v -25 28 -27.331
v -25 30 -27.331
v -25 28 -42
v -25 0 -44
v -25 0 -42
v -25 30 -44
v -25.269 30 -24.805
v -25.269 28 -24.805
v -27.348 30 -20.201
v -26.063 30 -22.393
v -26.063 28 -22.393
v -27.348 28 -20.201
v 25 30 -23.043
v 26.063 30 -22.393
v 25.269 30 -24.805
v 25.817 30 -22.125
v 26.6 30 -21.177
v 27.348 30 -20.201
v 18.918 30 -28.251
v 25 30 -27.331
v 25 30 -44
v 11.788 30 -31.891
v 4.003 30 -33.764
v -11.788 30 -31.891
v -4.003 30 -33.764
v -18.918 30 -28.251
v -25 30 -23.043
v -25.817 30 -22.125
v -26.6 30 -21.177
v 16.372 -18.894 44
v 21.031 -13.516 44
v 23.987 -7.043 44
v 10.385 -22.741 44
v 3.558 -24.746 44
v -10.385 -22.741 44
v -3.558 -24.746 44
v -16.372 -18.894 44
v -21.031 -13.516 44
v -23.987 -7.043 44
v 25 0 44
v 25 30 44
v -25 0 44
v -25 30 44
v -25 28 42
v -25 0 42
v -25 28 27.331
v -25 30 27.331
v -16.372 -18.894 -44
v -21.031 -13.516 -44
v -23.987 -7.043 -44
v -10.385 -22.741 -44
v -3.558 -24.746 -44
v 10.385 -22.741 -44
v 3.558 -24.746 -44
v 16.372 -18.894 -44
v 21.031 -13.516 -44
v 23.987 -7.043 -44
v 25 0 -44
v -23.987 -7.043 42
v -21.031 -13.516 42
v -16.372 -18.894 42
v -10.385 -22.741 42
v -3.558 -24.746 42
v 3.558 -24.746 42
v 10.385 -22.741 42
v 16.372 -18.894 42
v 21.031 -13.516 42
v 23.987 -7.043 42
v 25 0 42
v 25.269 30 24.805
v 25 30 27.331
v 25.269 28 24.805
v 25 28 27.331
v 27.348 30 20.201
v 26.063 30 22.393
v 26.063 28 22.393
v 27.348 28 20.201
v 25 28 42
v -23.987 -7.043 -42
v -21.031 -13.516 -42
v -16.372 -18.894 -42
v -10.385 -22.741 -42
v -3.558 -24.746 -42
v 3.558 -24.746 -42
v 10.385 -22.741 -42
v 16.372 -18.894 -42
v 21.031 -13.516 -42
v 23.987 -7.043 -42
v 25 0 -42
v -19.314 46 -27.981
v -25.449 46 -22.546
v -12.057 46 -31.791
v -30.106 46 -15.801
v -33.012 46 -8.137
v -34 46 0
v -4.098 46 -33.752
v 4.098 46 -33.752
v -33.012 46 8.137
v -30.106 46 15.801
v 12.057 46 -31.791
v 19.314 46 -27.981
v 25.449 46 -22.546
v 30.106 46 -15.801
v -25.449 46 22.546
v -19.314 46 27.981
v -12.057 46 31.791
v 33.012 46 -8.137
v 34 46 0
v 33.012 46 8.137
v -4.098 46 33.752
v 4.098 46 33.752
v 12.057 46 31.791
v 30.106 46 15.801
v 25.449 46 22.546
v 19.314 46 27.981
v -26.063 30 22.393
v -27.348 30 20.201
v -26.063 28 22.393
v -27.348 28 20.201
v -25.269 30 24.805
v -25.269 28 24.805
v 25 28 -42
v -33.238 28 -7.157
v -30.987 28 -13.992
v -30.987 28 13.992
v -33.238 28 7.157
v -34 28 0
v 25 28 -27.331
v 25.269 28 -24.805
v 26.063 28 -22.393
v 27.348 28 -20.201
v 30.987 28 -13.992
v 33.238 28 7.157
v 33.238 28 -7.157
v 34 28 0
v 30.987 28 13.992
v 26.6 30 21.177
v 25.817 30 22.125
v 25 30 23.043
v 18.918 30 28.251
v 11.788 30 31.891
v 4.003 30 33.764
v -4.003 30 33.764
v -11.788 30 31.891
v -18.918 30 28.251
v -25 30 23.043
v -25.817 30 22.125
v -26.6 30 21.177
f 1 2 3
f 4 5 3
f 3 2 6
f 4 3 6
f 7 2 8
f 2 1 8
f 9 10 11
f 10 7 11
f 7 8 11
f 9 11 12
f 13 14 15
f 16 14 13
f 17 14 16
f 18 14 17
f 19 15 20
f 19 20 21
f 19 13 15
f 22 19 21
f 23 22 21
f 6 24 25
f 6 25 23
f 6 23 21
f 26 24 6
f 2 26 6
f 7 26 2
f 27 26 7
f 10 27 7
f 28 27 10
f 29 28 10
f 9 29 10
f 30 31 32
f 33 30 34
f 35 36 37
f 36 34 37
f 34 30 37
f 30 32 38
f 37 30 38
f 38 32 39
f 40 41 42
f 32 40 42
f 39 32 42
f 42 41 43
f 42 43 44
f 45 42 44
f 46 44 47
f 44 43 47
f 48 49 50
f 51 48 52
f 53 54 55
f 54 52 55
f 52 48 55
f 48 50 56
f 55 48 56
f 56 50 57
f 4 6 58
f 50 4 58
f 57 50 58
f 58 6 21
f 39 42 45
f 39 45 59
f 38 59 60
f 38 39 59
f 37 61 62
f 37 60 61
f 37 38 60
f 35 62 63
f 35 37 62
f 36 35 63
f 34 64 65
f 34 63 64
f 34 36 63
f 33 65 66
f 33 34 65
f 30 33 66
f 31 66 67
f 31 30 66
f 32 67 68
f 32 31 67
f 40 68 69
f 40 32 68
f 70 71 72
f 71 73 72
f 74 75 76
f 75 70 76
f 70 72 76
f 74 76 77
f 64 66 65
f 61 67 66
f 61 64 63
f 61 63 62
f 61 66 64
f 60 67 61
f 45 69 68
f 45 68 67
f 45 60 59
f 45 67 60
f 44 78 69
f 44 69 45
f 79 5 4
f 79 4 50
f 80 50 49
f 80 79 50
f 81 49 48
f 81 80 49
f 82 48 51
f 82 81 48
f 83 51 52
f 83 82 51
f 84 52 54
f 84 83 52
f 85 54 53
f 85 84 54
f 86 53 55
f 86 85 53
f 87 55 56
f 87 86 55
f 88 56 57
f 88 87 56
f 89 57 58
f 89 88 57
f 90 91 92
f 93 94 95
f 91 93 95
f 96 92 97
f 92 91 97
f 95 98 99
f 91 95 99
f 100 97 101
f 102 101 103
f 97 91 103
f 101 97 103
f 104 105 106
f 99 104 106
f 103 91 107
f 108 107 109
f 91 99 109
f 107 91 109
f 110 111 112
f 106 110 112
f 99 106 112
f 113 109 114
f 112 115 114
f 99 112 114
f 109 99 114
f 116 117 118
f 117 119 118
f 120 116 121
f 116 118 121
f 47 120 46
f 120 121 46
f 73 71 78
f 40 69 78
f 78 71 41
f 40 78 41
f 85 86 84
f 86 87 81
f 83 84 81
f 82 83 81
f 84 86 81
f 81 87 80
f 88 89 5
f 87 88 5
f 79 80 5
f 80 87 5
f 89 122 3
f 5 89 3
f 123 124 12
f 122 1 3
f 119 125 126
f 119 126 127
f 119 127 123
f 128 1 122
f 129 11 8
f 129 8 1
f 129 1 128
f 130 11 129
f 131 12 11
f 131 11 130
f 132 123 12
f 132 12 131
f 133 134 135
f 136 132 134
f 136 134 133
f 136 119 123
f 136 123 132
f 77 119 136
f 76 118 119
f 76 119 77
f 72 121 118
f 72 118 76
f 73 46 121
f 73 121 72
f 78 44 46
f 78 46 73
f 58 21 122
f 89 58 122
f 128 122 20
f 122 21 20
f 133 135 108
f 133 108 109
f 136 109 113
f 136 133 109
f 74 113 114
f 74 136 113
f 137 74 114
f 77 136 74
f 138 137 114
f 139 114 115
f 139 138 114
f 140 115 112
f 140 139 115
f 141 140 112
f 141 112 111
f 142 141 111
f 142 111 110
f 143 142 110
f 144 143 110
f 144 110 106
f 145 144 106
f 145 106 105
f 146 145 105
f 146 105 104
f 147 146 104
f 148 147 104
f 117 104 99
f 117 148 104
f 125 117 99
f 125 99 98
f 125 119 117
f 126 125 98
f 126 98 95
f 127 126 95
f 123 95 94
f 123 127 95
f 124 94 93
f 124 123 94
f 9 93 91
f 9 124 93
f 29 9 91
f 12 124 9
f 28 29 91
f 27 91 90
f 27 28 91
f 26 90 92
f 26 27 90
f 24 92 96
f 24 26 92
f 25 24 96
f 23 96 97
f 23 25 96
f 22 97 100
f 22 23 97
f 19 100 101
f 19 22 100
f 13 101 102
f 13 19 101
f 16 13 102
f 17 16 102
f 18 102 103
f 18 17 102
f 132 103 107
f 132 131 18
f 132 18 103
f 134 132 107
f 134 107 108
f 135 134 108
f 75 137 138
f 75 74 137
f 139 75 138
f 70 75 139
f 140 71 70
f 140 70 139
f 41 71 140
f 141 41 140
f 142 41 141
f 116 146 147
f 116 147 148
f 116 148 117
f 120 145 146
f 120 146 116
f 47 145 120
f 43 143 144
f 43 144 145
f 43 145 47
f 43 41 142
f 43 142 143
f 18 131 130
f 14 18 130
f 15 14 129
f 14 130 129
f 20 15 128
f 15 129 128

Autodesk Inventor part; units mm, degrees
ref_plane "YZ Plane" through (0, 0, 0) normal (1, 0, 0) x (0, 1, 0)
ref_plane "XZ Plane" through (0, 0, 0) normal (0, 1, 0) x (-1, 0, 0)
ref_plane "XY Plane" through (0, 0, 0) normal (0, 0, 1) x (1, 0, 0)
sketch "スケッチ1" plane through (0, 0, 0) normal (0, 1, 0) x (-1, 0, 0)
  line L0 (25, -44) -> (-25, -44)
  line L1 (-25, -44) -> (-25, 44)
  line L2 (-25, 44) -> (25, 44)
  line L3 (25, 44) -> (25, -44)
  line L4 (25, -44) -> (-25, 44) construction
  line L5 (-25, -44) -> (25, 44) construction
  point P0 (0, 0)
  dimension "d0" = 50
  dimension "d1" = 88
extrude "押し出し1" add sketch "スケッチ1" against normal blind 2
sketch "スケッチ2" plane through (0, -2, 0) normal (0, -1, 0) x (1, 0, 0)
  line L0 (-25, 44) -> (-25, -44) projected
  line L1 (25, -44) -> (25, 44) projected
  line L2 (-25, -44) -> (25, -44)
  line L3 (25, -44) -> (25, -42)
  line L4 (25, -42) -> (-25, -42)
  line L5 (-25, -42) -> (-25, -44)
  line L6 (25, 44) -> (-25, 44) projected
  line L7 (-25, 44) -> (25, 44)
  line L8 (25, 44) -> (25, 42)
  line L9 (25, 42) -> (-25, 42)
  line L10 (-25, 42) -> (-25, 44)
  point P0 (0, 0)
  point P1 (-25, 42)
  point P2 (25, 42)
  point P3 (25, -44)
  dimension "d4" = 2
  dimension "d5" = 2
extrude "押し出し2" add sketch "スケッチ2" along normal blind 53 contours L6 L1 L9 L0 | L4 L1 L2 L0
sketch "スケッチ3" plane through (-25, 0, 44) normal (0, 0, 1) x (1, 0, 0)
  line L0 (0, 0) -> (50, 0) projected
  line L1 (0, 0) -> (0, -55) projected
  line L2 (50, -55) -> (0, -55) projected
  line L3 (50, 0) -> (50, -55) projected
  circle A0 centre (25, -30) radius 25
  line L4 (50, 0) -> (50, -55) projected
  point P0 (25, 0)
  point P1 (50, -30)
  point P2 (25, -55)
  point P3 (0, -30)
extrude "押し出し3" cut sketch "スケッチ3" against normal through all contours A0 L2 L1 | L3 L2 A0
move or copy body "移動1" bodies to move or copy 1 copy no translate (0, 30, 0)
sketch "スケッチ4" plane through (-25, 28, 42) normal (0, -1, 0) x (1, 0, 0)
  circle A0 centre (25, -42) radius 34
  dimension "d14" = 68
extrude "押し出し4" add sketch "スケッチ4" against normal blind 18
fillet "フィレット2" radius 12 4 edges at (25, 29, 23.0434) (25, 29, -23.0434) (-25, 29, 23.0434) (-25, 29, -23.0434)
properties part number "link4"
